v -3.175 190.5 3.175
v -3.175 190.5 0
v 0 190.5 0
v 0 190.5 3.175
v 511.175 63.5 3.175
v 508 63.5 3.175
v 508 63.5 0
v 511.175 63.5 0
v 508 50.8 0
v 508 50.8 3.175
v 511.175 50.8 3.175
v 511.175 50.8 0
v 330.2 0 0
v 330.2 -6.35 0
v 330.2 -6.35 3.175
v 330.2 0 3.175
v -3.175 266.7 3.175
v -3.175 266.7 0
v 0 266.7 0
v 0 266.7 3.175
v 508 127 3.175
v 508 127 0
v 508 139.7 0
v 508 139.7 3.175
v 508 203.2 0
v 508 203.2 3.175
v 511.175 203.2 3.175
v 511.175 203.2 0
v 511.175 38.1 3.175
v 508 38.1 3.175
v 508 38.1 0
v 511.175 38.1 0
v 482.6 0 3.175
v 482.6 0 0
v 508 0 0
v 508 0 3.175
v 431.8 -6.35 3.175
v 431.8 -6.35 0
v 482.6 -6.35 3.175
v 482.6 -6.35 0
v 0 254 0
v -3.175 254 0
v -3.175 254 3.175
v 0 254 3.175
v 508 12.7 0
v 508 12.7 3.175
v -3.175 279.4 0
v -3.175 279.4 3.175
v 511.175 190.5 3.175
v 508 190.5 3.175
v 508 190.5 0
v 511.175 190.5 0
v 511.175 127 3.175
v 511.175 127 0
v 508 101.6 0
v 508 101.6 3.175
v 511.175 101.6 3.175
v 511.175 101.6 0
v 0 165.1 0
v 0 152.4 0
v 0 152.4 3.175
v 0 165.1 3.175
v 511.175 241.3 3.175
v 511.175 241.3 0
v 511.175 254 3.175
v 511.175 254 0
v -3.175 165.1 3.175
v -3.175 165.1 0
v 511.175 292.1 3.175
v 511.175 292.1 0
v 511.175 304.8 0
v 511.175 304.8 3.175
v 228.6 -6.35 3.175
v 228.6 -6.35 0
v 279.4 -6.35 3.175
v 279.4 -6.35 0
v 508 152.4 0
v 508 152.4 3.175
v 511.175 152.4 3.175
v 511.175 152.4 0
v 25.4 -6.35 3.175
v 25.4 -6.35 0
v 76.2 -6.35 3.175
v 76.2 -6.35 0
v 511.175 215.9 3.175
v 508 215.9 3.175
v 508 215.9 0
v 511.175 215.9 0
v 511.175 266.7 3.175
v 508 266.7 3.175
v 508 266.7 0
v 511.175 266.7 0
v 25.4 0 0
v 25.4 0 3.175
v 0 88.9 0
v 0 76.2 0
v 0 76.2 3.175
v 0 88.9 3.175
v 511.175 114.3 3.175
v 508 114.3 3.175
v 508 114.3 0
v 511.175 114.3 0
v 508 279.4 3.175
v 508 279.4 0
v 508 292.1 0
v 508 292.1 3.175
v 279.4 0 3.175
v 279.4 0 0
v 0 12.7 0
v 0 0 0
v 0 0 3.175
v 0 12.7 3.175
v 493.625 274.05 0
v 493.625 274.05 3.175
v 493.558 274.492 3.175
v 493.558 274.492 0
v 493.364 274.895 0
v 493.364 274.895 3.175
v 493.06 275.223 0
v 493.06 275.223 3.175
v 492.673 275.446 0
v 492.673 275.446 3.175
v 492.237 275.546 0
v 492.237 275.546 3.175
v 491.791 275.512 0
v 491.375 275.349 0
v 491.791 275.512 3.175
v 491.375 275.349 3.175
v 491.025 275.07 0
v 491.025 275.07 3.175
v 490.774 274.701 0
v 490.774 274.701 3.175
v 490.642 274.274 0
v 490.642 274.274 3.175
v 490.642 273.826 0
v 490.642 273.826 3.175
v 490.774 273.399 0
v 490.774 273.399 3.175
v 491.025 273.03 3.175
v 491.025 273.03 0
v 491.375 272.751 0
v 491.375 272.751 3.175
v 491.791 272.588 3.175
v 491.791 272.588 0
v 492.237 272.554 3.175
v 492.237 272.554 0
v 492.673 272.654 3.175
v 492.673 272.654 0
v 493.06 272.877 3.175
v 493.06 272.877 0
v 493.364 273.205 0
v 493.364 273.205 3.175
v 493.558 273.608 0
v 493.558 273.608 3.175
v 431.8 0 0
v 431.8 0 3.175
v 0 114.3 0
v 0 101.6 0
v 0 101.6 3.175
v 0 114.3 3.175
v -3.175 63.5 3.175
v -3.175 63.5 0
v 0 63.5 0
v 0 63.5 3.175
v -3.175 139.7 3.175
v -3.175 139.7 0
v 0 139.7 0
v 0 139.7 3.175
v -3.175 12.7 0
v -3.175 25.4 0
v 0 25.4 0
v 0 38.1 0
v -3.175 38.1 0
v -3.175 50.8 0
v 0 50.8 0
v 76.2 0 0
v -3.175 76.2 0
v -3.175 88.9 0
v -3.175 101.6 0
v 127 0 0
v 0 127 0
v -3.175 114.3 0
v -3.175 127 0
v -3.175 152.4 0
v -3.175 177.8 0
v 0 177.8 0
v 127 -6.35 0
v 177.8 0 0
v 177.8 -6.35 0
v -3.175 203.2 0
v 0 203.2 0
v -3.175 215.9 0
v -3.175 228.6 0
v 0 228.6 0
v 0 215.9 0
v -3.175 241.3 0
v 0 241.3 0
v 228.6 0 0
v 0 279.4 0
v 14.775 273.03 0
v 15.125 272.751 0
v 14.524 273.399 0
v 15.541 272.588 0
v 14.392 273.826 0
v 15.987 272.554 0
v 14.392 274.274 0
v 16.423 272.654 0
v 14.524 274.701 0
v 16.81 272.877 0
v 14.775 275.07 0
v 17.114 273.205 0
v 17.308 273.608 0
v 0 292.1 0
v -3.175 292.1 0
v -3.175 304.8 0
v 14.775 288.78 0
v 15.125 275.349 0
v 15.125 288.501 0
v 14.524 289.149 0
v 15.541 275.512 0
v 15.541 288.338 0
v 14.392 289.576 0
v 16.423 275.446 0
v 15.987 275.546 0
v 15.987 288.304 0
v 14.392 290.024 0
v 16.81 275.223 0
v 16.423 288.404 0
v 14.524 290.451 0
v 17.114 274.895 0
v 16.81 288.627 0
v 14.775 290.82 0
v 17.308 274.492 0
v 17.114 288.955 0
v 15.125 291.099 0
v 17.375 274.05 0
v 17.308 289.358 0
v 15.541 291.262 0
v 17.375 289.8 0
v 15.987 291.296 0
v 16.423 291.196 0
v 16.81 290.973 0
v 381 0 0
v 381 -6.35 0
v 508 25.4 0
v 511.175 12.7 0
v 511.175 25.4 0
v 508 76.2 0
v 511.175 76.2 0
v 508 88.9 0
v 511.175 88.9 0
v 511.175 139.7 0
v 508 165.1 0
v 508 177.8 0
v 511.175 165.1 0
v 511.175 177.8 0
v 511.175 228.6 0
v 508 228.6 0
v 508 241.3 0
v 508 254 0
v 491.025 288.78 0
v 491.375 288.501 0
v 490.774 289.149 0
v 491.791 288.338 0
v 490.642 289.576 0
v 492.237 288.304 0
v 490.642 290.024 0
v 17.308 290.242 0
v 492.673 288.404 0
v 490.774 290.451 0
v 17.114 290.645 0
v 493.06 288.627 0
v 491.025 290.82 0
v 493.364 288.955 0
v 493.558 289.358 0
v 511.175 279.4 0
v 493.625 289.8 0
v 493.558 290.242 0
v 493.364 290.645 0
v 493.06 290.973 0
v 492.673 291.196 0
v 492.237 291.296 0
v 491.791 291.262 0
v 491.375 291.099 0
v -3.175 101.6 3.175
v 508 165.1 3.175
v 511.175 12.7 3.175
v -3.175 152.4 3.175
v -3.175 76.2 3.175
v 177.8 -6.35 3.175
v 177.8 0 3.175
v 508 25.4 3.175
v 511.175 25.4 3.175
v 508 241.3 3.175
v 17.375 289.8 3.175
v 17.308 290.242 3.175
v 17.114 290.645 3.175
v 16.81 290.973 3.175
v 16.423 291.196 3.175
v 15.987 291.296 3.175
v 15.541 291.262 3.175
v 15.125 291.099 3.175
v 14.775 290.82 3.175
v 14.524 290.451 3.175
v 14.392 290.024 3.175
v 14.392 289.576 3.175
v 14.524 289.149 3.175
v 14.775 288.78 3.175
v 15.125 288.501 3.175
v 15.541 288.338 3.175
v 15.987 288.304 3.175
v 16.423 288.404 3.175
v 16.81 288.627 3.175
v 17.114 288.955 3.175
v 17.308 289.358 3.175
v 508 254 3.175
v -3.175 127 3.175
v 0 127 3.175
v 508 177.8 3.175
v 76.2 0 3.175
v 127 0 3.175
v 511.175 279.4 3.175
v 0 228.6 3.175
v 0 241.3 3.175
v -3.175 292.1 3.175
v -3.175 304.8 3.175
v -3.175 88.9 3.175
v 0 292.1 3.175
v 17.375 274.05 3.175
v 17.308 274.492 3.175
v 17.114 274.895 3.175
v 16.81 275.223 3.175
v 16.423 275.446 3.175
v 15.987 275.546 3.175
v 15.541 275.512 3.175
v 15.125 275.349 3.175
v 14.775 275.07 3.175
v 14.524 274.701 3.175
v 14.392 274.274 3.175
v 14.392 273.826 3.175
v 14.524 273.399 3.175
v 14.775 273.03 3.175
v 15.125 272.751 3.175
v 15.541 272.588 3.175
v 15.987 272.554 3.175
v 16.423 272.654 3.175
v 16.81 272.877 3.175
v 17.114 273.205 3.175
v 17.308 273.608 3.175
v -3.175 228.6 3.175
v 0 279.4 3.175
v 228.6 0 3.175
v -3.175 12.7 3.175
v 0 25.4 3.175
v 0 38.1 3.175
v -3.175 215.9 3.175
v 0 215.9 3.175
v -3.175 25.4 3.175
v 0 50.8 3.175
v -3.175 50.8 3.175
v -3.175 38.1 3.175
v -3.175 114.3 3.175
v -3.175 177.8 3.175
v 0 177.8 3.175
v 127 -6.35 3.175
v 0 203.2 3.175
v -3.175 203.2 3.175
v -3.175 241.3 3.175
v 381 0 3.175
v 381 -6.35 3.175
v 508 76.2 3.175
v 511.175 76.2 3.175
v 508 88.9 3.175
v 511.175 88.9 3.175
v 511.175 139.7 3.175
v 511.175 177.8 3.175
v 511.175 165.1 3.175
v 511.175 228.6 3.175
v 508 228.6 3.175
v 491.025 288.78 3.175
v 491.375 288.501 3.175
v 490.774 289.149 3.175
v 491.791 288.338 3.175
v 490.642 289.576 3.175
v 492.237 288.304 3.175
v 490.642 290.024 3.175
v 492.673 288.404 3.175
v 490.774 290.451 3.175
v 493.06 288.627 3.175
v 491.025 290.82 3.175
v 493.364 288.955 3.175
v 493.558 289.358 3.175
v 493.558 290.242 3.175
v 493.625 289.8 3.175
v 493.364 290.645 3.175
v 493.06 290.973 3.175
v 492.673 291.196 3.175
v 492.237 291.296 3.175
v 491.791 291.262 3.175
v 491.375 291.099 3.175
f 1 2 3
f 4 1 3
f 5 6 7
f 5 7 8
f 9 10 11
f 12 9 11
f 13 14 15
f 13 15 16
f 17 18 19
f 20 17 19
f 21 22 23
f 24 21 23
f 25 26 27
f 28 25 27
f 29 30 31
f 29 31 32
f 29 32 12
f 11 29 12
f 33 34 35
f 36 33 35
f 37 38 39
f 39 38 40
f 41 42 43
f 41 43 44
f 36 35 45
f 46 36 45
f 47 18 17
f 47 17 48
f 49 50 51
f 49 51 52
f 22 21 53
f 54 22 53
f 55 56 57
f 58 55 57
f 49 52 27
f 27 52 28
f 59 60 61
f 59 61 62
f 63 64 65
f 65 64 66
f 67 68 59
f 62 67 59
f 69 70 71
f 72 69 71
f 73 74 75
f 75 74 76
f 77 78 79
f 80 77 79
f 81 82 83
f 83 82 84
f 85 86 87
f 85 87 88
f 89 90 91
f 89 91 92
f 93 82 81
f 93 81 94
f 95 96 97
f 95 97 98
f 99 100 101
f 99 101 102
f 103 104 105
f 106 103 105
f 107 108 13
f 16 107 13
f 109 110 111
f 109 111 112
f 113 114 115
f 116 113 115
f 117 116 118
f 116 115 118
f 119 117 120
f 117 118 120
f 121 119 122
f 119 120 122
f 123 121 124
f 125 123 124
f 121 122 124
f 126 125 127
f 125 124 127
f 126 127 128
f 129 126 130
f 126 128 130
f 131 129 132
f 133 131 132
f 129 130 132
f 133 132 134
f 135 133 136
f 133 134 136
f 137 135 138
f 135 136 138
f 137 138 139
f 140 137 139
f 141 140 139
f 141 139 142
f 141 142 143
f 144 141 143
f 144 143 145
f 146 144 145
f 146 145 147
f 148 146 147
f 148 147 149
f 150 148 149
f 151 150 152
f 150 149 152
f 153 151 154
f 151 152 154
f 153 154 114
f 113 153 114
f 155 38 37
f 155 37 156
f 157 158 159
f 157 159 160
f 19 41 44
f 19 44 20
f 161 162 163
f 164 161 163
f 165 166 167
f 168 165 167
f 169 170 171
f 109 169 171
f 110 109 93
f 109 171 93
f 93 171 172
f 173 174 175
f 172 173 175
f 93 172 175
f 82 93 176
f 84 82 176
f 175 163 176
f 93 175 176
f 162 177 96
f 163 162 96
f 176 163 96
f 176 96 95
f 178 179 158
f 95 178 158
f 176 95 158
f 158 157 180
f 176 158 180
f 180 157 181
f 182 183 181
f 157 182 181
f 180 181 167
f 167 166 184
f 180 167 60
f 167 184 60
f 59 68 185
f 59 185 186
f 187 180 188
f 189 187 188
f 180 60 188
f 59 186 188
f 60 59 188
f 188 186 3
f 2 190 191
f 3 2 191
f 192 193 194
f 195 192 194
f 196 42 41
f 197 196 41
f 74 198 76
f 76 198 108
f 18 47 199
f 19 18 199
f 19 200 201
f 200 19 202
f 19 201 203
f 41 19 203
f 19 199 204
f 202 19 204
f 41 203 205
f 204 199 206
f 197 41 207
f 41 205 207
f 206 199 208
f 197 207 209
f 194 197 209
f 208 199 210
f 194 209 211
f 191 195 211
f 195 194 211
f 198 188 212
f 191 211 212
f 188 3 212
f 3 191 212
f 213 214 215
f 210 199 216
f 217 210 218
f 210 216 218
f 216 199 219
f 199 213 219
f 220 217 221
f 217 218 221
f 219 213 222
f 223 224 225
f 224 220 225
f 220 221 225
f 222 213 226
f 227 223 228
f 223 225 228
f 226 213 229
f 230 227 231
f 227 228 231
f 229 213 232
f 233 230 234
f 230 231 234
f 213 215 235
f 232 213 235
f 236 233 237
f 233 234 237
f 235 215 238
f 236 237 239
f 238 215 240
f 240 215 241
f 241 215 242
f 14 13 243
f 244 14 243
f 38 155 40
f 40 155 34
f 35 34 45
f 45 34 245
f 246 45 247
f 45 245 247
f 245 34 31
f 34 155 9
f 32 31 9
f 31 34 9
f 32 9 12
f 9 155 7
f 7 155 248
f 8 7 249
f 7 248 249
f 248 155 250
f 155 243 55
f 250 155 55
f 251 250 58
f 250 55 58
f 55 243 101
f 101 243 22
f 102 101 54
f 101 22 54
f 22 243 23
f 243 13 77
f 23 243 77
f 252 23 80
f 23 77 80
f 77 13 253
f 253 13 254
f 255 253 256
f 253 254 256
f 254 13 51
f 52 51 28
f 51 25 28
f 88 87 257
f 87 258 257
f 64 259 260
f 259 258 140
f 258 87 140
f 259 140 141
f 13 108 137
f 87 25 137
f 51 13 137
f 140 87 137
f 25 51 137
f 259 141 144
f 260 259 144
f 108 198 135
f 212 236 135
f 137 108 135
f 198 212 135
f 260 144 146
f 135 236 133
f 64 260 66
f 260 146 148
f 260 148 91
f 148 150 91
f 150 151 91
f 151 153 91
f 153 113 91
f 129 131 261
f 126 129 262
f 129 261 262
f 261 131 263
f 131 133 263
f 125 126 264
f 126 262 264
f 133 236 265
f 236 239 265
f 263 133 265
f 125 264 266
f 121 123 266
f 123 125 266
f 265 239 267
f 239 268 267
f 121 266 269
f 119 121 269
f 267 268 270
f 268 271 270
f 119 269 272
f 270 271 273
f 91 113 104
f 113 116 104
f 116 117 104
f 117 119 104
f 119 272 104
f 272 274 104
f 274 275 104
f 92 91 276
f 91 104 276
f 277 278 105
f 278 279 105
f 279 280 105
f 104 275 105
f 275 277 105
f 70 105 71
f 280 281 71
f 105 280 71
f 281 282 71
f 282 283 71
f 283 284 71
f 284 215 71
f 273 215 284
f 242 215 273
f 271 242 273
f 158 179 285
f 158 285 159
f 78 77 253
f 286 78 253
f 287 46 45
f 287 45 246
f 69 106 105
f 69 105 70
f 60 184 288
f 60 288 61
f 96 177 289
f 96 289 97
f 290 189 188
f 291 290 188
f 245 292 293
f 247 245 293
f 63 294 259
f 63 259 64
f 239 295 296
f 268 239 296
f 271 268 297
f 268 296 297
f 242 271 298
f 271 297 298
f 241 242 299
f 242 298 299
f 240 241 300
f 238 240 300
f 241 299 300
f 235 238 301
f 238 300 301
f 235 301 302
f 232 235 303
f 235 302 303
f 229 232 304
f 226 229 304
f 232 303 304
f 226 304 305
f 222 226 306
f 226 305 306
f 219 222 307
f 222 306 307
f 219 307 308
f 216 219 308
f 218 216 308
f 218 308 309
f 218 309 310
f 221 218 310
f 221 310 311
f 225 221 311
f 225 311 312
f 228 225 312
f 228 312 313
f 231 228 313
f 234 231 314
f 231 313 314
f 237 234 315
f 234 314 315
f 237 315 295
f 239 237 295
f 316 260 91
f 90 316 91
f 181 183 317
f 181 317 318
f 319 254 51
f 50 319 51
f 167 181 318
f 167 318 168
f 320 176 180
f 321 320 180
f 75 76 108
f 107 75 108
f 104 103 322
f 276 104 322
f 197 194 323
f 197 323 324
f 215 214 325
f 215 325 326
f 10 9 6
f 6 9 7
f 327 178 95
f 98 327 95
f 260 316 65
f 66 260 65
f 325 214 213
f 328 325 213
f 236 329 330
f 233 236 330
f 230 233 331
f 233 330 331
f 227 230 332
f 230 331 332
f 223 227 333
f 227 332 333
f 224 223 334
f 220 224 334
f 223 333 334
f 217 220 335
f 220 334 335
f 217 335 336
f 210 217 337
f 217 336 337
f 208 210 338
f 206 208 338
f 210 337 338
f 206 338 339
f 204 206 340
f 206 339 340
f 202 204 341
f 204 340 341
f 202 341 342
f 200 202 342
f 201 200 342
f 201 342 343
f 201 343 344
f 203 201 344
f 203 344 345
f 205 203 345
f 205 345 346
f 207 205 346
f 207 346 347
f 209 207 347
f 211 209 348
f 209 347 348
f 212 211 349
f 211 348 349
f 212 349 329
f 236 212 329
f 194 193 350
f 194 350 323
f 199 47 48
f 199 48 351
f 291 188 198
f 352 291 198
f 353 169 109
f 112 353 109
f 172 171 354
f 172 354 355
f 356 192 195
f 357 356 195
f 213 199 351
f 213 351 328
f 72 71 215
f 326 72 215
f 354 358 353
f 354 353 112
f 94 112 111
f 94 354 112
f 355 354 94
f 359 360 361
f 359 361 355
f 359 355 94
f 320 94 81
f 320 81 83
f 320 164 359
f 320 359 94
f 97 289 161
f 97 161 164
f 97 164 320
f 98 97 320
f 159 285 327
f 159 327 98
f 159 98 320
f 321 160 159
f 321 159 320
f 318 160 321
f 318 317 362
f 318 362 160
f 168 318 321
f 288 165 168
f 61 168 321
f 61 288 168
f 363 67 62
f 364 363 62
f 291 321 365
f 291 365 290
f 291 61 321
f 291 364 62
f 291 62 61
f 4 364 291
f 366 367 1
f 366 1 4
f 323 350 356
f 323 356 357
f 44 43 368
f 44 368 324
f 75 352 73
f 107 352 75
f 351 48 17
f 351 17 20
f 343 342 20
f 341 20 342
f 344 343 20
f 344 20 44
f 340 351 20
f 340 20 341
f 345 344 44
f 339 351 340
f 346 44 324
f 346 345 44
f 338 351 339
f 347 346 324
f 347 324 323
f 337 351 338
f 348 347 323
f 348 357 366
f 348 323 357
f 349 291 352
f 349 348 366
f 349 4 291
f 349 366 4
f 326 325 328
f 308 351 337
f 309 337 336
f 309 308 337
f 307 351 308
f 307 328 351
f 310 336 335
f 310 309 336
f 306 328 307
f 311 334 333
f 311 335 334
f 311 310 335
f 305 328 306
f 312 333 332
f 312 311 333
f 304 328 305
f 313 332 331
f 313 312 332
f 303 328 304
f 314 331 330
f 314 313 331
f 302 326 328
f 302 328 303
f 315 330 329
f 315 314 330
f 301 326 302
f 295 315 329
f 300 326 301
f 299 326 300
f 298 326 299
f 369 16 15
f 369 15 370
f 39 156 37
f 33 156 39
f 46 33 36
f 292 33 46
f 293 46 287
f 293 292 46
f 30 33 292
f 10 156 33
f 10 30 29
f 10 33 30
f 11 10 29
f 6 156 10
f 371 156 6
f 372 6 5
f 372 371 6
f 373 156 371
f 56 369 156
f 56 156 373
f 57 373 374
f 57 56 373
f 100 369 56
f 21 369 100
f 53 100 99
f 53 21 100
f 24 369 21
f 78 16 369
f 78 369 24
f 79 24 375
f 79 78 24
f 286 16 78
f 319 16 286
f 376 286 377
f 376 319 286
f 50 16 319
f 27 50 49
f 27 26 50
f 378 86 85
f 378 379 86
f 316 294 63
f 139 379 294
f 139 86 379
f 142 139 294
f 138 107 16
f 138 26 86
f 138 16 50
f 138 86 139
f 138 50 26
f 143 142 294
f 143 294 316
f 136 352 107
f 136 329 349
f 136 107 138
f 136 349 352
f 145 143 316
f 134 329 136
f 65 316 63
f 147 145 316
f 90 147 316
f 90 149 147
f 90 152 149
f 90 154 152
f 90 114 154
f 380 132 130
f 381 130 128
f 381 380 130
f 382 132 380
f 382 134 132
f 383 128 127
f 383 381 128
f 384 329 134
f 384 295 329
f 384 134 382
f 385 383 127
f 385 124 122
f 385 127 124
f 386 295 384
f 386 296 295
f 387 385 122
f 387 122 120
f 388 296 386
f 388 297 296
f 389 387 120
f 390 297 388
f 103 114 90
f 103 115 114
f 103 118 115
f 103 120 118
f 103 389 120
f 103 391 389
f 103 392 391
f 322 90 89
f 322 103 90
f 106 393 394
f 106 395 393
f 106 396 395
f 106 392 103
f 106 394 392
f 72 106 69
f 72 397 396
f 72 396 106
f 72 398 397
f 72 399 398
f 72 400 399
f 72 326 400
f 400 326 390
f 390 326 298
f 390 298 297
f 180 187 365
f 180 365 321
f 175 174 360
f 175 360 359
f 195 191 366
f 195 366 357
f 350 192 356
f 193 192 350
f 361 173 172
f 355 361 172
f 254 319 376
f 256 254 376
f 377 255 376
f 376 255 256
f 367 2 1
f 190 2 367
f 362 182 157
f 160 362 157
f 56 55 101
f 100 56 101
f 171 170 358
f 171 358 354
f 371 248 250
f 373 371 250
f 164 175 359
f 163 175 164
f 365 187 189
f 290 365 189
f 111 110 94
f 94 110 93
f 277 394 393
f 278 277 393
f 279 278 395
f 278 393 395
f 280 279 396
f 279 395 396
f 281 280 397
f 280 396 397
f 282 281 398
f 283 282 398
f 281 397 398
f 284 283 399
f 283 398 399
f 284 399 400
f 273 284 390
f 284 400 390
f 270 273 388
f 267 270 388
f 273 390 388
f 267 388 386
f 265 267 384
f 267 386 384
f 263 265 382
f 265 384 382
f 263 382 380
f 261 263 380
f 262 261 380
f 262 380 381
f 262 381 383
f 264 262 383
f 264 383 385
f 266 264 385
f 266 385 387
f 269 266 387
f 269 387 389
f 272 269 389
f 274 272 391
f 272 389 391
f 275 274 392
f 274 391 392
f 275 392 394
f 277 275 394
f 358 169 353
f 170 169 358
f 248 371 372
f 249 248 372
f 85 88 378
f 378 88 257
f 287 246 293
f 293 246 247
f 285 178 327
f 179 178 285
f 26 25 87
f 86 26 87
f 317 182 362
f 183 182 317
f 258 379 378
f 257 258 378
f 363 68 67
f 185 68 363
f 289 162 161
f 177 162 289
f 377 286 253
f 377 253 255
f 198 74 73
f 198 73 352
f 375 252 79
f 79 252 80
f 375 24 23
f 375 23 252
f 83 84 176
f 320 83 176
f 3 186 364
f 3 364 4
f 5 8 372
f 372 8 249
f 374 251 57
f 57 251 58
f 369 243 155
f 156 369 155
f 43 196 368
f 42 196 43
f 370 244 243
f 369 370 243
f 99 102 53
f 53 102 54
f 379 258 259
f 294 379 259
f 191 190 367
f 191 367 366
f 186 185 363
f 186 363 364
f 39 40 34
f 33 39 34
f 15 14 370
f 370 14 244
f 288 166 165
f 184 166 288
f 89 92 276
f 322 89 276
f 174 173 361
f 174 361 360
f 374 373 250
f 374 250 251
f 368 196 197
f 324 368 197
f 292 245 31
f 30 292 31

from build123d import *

# Parameters (mm, degrees)
SKETCH1_W           = 508
SKETCH1_H           = 304.8
SKETCH1_W_2         = 50.8
SKETCH1_H_2         = 6.35
SKETCH1_W_3         = 3.175
SKETCH1_H_3         = 12.7
BOSS_EXTRUDE1_DEPTH = 3.175
SKETCH2_R           = 1.5
SKETCH2_R_2         = 1.499997
CUT_EXTRUDE1_DEPTH  = 3.175


with BuildPart() as part:
    # Sketch1 → Boss-Extrude1 (new body)
    with BuildSketch(Plane.XY):
        with Locations((254, 152.4)):
            Rectangle(SKETCH1_W, SKETCH1_H)
        with Locations((50.8, -3.175)):
            Rectangle(SKETCH1_W_2, SKETCH1_H_2)
        with Locations((152.4, -3.175)):
            Rectangle(SKETCH1_W_2, SKETCH1_H_2)
        with Locations((254, -3.175)):
            Rectangle(SKETCH1_W_2, SKETCH1_H_2)
        with Locations((355.6, -3.175)):
            Rectangle(SKETCH1_W_2, SKETCH1_H_2)
        with Locations((457.2, -3.175)):
            Rectangle(SKETCH1_W_2, SKETCH1_H_2)
        with Locations((-1.5875, 19.05)):
            Rectangle(SKETCH1_W_3, SKETCH1_H_3)
        with Locations((-1.5875, 44.45)):
            Rectangle(SKETCH1_W_3, SKETCH1_H_3)
        with Locations((-1.5875, 69.85)):
            Rectangle(SKETCH1_W_3, SKETCH1_H_3)
        with Locations((-1.5875, 95.25)):
            Rectangle(SKETCH1_W_3, SKETCH1_H_3)
        with Locations((-1.5875, 120.65)):
            Rectangle(SKETCH1_W_3, SKETCH1_H_3)
        with Locations((-1.5875, 146.05)):
            Rectangle(SKETCH1_W_3, SKETCH1_H_3)
        with Locations((-1.5875, 171.45)):
            Rectangle(SKETCH1_W_3, SKETCH1_H_3)
        with Locations((-1.5875, 196.85)):
            Rectangle(SKETCH1_W_3, SKETCH1_H_3)
        with Locations((-1.5875, 222.25)):
            Rectangle(SKETCH1_W_3, SKETCH1_H_3)
        with Locations((-1.5875, 247.65)):
            Rectangle(SKETCH1_W_3, SKETCH1_H_3)
        with Locations((-1.5875, 273.05)):
            Rectangle(SKETCH1_W_3, SKETCH1_H_3)
        with Locations((-1.5875, 298.45)):
            Rectangle(SKETCH1_W_3, SKETCH1_H_3)
        with Locations((509.5875, 19.05)):
            Rectangle(SKETCH1_W_3, SKETCH1_H_3)
        with Locations((509.5875, 44.45)):
            Rectangle(SKETCH1_W_3, SKETCH1_H_3)
        with Locations((509.5875, 69.85)):
            Rectangle(SKETCH1_W_3, SKETCH1_H_3)
        with Locations((509.5875, 95.25)):
            Rectangle(SKETCH1_W_3, SKETCH1_H_3)
        with Locations((509.5875, 146.05)):
            Rectangle(SKETCH1_W_3, SKETCH1_H_3)
        with Locations((509.5875, 120.65)):
            Rectangle(SKETCH1_W_3, SKETCH1_H_3)
        with Locations((509.5875, 171.45)):
            Rectangle(SKETCH1_W_3, SKETCH1_H_3)
        with Locations((509.5875, 196.85)):
            Rectangle(SKETCH1_W_3, SKETCH1_H_3)
        with Locations((509.5875, 222.25)):
            Rectangle(SKETCH1_W_3, SKETCH1_H_3)
        with Locations((509.5875, 247.65)):
            Rectangle(SKETCH1_W_3, SKETCH1_H_3)
        with Locations((509.5875, 273.05)):
            Rectangle(SKETCH1_W_3, SKETCH1_H_3)
        with Locations((509.5875, 298.45)):
            Rectangle(SKETCH1_W_3, SKETCH1_H_3)
    extrude(amount=BOSS_EXTRUDE1_DEPTH)

    # Sketch2 → Cut-Extrude1 (cut)
    with BuildSketch(Plane.XY.offset(3.175)):
        with Locations((15.875, 289.8)):
            Circle(SKETCH2_R)
        with Locations((15.875, 274.05)):
            Circle(SKETCH2_R_2)
        with Locations((492.125, 289.8)):
            Circle(SKETCH2_R)
        with Locations((492.125, 274.05)):
            Circle(SKETCH2_R_2)
    extrude(amount=-CUT_EXTRUDE1_DEPTH, mode=Mode.SUBTRACT)


solid = part.part
